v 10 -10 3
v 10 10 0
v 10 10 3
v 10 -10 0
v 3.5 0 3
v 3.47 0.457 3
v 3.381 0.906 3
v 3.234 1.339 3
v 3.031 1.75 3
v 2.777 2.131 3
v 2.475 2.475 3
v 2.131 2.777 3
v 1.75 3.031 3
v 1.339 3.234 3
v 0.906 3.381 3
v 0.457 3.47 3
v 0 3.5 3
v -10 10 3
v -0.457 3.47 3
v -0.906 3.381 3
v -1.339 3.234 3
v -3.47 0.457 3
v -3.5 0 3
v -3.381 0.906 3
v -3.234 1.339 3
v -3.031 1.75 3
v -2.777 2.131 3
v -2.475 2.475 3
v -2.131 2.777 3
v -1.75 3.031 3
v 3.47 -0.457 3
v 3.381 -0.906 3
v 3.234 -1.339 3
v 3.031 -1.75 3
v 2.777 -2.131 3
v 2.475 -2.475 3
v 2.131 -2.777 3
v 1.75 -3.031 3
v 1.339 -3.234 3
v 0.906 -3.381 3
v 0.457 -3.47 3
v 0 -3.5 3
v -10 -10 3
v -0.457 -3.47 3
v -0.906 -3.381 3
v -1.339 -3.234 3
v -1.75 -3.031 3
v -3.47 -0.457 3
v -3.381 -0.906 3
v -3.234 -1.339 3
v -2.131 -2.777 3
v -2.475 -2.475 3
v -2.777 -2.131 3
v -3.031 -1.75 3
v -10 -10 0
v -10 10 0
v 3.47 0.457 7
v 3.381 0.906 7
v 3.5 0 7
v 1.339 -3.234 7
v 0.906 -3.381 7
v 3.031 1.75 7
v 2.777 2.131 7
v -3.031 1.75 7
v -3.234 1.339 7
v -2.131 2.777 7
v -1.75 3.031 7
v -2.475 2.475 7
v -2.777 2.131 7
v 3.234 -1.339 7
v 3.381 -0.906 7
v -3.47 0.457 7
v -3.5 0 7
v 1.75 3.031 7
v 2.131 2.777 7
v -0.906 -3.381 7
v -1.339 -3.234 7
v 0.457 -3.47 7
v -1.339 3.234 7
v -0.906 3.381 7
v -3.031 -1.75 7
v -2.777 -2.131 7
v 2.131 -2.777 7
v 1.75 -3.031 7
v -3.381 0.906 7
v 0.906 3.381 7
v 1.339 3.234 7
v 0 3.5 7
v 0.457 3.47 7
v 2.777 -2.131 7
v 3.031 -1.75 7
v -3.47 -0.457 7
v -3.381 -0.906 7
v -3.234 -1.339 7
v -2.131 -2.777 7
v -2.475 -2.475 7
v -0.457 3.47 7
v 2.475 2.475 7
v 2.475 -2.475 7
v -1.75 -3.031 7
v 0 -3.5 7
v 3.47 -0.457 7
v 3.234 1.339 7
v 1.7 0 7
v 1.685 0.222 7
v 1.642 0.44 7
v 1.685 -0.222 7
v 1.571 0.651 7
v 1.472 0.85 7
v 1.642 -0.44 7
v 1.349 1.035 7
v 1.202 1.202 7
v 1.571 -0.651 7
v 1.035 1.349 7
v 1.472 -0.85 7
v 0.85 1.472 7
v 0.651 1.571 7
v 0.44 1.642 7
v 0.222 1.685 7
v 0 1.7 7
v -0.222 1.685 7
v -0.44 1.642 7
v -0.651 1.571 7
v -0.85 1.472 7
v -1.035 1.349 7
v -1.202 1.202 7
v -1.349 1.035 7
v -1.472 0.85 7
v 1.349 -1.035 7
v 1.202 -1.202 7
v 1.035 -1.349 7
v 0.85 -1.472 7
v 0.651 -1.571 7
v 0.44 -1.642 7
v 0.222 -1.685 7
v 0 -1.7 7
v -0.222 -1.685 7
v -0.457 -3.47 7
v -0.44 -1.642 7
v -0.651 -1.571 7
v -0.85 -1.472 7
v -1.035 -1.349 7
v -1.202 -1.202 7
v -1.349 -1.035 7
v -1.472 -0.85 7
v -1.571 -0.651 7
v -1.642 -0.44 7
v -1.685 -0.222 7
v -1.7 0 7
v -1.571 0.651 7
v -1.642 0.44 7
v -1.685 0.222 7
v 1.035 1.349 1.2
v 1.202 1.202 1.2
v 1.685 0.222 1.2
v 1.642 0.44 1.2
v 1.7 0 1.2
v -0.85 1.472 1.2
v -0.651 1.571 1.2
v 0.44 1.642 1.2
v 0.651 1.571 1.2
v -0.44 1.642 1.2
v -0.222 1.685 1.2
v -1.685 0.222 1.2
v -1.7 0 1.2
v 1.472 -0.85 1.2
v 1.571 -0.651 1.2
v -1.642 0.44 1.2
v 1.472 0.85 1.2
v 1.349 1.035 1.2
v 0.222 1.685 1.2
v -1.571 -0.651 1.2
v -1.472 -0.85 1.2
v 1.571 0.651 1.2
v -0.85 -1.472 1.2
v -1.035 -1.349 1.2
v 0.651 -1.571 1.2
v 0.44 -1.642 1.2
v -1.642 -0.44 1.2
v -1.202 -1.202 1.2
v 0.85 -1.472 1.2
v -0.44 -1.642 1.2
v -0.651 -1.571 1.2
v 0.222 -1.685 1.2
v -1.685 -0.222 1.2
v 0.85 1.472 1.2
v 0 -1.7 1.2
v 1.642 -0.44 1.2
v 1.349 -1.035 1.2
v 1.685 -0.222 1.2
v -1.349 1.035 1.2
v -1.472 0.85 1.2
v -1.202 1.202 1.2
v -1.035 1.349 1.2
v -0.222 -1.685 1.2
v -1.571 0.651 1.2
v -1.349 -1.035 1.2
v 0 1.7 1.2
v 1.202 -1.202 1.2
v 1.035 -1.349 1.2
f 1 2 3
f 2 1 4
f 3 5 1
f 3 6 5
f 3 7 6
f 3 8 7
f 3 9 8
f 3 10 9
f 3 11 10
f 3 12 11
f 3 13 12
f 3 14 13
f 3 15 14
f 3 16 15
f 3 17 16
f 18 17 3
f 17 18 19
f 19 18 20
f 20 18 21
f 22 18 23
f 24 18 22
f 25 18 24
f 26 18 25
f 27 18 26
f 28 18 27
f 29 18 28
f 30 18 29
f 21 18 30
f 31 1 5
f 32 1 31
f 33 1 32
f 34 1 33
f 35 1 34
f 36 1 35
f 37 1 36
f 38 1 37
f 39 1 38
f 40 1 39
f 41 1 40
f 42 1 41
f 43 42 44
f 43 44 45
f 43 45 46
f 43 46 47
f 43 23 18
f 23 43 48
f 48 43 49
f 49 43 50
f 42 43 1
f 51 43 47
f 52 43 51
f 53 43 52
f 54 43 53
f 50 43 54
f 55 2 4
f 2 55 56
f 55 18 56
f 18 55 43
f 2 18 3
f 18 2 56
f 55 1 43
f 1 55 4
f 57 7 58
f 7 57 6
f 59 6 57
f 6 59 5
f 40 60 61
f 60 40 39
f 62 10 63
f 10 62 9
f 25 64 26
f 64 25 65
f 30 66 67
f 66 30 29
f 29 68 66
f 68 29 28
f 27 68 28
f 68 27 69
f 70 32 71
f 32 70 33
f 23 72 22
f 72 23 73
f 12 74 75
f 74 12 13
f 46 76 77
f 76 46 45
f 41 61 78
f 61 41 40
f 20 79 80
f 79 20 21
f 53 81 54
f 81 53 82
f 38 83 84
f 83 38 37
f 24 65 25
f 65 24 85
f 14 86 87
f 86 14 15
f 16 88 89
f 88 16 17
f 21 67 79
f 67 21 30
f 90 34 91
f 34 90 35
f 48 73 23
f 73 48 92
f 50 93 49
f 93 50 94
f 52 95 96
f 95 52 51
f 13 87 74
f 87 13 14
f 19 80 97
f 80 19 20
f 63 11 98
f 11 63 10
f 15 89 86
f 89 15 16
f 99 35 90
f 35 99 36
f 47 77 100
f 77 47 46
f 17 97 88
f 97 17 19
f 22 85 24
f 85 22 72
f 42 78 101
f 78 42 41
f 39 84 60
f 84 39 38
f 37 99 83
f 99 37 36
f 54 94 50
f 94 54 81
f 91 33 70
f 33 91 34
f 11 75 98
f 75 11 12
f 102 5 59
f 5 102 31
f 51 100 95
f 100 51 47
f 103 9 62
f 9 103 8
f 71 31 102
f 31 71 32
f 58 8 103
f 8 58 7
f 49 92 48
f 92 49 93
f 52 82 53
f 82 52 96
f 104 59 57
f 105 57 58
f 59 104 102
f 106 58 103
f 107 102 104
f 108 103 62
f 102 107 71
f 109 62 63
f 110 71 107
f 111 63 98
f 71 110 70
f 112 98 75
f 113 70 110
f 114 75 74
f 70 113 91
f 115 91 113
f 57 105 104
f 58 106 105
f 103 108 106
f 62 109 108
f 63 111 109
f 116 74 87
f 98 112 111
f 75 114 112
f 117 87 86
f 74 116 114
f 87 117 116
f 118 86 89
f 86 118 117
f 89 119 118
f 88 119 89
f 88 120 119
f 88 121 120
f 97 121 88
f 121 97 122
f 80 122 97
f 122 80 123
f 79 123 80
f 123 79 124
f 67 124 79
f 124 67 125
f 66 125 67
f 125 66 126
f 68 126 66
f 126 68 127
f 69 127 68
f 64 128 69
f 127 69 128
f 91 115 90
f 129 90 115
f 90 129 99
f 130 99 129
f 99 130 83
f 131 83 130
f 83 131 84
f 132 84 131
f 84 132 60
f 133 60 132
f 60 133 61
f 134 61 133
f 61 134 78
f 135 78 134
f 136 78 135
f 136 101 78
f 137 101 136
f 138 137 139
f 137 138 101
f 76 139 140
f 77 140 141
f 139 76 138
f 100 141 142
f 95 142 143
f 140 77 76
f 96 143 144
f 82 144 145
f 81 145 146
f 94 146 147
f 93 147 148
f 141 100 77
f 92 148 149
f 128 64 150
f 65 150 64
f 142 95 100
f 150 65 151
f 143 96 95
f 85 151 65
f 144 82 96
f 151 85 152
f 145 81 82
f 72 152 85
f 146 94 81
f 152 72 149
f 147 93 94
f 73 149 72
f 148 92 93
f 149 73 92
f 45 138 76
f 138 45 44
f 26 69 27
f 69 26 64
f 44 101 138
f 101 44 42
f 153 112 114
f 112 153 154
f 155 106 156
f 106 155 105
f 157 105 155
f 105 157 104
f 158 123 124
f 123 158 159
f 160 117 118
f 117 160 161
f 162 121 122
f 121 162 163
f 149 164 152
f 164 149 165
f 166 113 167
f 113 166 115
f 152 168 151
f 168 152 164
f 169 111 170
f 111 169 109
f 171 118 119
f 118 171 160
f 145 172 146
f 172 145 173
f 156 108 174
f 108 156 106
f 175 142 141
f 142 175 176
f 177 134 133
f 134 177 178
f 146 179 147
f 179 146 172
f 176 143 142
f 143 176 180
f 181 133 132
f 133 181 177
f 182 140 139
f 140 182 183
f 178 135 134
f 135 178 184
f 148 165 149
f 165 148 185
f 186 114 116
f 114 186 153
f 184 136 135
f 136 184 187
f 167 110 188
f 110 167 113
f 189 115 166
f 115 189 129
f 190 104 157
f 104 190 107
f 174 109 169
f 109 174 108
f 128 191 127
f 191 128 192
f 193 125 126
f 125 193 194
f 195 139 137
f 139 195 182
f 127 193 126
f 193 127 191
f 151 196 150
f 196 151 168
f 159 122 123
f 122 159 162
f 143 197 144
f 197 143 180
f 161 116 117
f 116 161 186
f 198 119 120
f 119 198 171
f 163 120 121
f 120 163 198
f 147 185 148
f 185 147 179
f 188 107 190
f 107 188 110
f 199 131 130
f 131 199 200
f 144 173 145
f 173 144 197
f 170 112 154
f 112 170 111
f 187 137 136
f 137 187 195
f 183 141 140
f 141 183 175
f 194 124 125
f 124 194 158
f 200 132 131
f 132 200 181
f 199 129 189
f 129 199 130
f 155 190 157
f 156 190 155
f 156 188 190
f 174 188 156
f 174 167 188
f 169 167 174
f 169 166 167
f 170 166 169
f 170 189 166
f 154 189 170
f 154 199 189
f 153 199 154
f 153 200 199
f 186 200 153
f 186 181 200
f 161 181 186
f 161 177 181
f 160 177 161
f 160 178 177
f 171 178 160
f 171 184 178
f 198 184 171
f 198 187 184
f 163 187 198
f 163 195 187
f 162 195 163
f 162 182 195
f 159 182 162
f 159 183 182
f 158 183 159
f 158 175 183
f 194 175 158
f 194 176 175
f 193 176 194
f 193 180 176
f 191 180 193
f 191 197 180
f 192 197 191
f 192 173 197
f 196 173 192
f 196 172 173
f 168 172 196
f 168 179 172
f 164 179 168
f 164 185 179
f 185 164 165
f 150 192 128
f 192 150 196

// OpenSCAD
// Issue #166 - heat-set insert test coupon for the current accessory boss.
//
// Print this small coupon before fitting a brass M3 heat-set insert to the real
// enclosure. It reproduces one current backplane boss:
//   7 mm OD x 4 mm high
//   3.4 mm blind hole
//   3 mm rear wall with 1.2 mm unbroken outer skin
//
// The coupon is only a printed test boss. The actual threaded insert is a purchased brass M3 heat-set insert; it is not printed and it is not a bolt.

$fn = 48;

wall_t = 3.0;
outer_skin = 1.2;
boss_d = 7.0;
boss_h = 4.0;
hole_d = 3.4;
hole_depth = boss_h + wall_t - outer_skin;

coupon_w = 20;
coupon_h = 20;

difference() {
    union() {
        translate([-coupon_w/2,-coupon_h/2,0])
            cube([coupon_w,coupon_h,wall_t]);
        translate([0,0,wall_t-0.2])
            cylinder(d=boss_d,h=boss_h+0.2);
    }

    translate([0,0,wall_t+boss_h-hole_depth])
        cylinder(d=hole_d,h=hole_depth+0.1);
}
